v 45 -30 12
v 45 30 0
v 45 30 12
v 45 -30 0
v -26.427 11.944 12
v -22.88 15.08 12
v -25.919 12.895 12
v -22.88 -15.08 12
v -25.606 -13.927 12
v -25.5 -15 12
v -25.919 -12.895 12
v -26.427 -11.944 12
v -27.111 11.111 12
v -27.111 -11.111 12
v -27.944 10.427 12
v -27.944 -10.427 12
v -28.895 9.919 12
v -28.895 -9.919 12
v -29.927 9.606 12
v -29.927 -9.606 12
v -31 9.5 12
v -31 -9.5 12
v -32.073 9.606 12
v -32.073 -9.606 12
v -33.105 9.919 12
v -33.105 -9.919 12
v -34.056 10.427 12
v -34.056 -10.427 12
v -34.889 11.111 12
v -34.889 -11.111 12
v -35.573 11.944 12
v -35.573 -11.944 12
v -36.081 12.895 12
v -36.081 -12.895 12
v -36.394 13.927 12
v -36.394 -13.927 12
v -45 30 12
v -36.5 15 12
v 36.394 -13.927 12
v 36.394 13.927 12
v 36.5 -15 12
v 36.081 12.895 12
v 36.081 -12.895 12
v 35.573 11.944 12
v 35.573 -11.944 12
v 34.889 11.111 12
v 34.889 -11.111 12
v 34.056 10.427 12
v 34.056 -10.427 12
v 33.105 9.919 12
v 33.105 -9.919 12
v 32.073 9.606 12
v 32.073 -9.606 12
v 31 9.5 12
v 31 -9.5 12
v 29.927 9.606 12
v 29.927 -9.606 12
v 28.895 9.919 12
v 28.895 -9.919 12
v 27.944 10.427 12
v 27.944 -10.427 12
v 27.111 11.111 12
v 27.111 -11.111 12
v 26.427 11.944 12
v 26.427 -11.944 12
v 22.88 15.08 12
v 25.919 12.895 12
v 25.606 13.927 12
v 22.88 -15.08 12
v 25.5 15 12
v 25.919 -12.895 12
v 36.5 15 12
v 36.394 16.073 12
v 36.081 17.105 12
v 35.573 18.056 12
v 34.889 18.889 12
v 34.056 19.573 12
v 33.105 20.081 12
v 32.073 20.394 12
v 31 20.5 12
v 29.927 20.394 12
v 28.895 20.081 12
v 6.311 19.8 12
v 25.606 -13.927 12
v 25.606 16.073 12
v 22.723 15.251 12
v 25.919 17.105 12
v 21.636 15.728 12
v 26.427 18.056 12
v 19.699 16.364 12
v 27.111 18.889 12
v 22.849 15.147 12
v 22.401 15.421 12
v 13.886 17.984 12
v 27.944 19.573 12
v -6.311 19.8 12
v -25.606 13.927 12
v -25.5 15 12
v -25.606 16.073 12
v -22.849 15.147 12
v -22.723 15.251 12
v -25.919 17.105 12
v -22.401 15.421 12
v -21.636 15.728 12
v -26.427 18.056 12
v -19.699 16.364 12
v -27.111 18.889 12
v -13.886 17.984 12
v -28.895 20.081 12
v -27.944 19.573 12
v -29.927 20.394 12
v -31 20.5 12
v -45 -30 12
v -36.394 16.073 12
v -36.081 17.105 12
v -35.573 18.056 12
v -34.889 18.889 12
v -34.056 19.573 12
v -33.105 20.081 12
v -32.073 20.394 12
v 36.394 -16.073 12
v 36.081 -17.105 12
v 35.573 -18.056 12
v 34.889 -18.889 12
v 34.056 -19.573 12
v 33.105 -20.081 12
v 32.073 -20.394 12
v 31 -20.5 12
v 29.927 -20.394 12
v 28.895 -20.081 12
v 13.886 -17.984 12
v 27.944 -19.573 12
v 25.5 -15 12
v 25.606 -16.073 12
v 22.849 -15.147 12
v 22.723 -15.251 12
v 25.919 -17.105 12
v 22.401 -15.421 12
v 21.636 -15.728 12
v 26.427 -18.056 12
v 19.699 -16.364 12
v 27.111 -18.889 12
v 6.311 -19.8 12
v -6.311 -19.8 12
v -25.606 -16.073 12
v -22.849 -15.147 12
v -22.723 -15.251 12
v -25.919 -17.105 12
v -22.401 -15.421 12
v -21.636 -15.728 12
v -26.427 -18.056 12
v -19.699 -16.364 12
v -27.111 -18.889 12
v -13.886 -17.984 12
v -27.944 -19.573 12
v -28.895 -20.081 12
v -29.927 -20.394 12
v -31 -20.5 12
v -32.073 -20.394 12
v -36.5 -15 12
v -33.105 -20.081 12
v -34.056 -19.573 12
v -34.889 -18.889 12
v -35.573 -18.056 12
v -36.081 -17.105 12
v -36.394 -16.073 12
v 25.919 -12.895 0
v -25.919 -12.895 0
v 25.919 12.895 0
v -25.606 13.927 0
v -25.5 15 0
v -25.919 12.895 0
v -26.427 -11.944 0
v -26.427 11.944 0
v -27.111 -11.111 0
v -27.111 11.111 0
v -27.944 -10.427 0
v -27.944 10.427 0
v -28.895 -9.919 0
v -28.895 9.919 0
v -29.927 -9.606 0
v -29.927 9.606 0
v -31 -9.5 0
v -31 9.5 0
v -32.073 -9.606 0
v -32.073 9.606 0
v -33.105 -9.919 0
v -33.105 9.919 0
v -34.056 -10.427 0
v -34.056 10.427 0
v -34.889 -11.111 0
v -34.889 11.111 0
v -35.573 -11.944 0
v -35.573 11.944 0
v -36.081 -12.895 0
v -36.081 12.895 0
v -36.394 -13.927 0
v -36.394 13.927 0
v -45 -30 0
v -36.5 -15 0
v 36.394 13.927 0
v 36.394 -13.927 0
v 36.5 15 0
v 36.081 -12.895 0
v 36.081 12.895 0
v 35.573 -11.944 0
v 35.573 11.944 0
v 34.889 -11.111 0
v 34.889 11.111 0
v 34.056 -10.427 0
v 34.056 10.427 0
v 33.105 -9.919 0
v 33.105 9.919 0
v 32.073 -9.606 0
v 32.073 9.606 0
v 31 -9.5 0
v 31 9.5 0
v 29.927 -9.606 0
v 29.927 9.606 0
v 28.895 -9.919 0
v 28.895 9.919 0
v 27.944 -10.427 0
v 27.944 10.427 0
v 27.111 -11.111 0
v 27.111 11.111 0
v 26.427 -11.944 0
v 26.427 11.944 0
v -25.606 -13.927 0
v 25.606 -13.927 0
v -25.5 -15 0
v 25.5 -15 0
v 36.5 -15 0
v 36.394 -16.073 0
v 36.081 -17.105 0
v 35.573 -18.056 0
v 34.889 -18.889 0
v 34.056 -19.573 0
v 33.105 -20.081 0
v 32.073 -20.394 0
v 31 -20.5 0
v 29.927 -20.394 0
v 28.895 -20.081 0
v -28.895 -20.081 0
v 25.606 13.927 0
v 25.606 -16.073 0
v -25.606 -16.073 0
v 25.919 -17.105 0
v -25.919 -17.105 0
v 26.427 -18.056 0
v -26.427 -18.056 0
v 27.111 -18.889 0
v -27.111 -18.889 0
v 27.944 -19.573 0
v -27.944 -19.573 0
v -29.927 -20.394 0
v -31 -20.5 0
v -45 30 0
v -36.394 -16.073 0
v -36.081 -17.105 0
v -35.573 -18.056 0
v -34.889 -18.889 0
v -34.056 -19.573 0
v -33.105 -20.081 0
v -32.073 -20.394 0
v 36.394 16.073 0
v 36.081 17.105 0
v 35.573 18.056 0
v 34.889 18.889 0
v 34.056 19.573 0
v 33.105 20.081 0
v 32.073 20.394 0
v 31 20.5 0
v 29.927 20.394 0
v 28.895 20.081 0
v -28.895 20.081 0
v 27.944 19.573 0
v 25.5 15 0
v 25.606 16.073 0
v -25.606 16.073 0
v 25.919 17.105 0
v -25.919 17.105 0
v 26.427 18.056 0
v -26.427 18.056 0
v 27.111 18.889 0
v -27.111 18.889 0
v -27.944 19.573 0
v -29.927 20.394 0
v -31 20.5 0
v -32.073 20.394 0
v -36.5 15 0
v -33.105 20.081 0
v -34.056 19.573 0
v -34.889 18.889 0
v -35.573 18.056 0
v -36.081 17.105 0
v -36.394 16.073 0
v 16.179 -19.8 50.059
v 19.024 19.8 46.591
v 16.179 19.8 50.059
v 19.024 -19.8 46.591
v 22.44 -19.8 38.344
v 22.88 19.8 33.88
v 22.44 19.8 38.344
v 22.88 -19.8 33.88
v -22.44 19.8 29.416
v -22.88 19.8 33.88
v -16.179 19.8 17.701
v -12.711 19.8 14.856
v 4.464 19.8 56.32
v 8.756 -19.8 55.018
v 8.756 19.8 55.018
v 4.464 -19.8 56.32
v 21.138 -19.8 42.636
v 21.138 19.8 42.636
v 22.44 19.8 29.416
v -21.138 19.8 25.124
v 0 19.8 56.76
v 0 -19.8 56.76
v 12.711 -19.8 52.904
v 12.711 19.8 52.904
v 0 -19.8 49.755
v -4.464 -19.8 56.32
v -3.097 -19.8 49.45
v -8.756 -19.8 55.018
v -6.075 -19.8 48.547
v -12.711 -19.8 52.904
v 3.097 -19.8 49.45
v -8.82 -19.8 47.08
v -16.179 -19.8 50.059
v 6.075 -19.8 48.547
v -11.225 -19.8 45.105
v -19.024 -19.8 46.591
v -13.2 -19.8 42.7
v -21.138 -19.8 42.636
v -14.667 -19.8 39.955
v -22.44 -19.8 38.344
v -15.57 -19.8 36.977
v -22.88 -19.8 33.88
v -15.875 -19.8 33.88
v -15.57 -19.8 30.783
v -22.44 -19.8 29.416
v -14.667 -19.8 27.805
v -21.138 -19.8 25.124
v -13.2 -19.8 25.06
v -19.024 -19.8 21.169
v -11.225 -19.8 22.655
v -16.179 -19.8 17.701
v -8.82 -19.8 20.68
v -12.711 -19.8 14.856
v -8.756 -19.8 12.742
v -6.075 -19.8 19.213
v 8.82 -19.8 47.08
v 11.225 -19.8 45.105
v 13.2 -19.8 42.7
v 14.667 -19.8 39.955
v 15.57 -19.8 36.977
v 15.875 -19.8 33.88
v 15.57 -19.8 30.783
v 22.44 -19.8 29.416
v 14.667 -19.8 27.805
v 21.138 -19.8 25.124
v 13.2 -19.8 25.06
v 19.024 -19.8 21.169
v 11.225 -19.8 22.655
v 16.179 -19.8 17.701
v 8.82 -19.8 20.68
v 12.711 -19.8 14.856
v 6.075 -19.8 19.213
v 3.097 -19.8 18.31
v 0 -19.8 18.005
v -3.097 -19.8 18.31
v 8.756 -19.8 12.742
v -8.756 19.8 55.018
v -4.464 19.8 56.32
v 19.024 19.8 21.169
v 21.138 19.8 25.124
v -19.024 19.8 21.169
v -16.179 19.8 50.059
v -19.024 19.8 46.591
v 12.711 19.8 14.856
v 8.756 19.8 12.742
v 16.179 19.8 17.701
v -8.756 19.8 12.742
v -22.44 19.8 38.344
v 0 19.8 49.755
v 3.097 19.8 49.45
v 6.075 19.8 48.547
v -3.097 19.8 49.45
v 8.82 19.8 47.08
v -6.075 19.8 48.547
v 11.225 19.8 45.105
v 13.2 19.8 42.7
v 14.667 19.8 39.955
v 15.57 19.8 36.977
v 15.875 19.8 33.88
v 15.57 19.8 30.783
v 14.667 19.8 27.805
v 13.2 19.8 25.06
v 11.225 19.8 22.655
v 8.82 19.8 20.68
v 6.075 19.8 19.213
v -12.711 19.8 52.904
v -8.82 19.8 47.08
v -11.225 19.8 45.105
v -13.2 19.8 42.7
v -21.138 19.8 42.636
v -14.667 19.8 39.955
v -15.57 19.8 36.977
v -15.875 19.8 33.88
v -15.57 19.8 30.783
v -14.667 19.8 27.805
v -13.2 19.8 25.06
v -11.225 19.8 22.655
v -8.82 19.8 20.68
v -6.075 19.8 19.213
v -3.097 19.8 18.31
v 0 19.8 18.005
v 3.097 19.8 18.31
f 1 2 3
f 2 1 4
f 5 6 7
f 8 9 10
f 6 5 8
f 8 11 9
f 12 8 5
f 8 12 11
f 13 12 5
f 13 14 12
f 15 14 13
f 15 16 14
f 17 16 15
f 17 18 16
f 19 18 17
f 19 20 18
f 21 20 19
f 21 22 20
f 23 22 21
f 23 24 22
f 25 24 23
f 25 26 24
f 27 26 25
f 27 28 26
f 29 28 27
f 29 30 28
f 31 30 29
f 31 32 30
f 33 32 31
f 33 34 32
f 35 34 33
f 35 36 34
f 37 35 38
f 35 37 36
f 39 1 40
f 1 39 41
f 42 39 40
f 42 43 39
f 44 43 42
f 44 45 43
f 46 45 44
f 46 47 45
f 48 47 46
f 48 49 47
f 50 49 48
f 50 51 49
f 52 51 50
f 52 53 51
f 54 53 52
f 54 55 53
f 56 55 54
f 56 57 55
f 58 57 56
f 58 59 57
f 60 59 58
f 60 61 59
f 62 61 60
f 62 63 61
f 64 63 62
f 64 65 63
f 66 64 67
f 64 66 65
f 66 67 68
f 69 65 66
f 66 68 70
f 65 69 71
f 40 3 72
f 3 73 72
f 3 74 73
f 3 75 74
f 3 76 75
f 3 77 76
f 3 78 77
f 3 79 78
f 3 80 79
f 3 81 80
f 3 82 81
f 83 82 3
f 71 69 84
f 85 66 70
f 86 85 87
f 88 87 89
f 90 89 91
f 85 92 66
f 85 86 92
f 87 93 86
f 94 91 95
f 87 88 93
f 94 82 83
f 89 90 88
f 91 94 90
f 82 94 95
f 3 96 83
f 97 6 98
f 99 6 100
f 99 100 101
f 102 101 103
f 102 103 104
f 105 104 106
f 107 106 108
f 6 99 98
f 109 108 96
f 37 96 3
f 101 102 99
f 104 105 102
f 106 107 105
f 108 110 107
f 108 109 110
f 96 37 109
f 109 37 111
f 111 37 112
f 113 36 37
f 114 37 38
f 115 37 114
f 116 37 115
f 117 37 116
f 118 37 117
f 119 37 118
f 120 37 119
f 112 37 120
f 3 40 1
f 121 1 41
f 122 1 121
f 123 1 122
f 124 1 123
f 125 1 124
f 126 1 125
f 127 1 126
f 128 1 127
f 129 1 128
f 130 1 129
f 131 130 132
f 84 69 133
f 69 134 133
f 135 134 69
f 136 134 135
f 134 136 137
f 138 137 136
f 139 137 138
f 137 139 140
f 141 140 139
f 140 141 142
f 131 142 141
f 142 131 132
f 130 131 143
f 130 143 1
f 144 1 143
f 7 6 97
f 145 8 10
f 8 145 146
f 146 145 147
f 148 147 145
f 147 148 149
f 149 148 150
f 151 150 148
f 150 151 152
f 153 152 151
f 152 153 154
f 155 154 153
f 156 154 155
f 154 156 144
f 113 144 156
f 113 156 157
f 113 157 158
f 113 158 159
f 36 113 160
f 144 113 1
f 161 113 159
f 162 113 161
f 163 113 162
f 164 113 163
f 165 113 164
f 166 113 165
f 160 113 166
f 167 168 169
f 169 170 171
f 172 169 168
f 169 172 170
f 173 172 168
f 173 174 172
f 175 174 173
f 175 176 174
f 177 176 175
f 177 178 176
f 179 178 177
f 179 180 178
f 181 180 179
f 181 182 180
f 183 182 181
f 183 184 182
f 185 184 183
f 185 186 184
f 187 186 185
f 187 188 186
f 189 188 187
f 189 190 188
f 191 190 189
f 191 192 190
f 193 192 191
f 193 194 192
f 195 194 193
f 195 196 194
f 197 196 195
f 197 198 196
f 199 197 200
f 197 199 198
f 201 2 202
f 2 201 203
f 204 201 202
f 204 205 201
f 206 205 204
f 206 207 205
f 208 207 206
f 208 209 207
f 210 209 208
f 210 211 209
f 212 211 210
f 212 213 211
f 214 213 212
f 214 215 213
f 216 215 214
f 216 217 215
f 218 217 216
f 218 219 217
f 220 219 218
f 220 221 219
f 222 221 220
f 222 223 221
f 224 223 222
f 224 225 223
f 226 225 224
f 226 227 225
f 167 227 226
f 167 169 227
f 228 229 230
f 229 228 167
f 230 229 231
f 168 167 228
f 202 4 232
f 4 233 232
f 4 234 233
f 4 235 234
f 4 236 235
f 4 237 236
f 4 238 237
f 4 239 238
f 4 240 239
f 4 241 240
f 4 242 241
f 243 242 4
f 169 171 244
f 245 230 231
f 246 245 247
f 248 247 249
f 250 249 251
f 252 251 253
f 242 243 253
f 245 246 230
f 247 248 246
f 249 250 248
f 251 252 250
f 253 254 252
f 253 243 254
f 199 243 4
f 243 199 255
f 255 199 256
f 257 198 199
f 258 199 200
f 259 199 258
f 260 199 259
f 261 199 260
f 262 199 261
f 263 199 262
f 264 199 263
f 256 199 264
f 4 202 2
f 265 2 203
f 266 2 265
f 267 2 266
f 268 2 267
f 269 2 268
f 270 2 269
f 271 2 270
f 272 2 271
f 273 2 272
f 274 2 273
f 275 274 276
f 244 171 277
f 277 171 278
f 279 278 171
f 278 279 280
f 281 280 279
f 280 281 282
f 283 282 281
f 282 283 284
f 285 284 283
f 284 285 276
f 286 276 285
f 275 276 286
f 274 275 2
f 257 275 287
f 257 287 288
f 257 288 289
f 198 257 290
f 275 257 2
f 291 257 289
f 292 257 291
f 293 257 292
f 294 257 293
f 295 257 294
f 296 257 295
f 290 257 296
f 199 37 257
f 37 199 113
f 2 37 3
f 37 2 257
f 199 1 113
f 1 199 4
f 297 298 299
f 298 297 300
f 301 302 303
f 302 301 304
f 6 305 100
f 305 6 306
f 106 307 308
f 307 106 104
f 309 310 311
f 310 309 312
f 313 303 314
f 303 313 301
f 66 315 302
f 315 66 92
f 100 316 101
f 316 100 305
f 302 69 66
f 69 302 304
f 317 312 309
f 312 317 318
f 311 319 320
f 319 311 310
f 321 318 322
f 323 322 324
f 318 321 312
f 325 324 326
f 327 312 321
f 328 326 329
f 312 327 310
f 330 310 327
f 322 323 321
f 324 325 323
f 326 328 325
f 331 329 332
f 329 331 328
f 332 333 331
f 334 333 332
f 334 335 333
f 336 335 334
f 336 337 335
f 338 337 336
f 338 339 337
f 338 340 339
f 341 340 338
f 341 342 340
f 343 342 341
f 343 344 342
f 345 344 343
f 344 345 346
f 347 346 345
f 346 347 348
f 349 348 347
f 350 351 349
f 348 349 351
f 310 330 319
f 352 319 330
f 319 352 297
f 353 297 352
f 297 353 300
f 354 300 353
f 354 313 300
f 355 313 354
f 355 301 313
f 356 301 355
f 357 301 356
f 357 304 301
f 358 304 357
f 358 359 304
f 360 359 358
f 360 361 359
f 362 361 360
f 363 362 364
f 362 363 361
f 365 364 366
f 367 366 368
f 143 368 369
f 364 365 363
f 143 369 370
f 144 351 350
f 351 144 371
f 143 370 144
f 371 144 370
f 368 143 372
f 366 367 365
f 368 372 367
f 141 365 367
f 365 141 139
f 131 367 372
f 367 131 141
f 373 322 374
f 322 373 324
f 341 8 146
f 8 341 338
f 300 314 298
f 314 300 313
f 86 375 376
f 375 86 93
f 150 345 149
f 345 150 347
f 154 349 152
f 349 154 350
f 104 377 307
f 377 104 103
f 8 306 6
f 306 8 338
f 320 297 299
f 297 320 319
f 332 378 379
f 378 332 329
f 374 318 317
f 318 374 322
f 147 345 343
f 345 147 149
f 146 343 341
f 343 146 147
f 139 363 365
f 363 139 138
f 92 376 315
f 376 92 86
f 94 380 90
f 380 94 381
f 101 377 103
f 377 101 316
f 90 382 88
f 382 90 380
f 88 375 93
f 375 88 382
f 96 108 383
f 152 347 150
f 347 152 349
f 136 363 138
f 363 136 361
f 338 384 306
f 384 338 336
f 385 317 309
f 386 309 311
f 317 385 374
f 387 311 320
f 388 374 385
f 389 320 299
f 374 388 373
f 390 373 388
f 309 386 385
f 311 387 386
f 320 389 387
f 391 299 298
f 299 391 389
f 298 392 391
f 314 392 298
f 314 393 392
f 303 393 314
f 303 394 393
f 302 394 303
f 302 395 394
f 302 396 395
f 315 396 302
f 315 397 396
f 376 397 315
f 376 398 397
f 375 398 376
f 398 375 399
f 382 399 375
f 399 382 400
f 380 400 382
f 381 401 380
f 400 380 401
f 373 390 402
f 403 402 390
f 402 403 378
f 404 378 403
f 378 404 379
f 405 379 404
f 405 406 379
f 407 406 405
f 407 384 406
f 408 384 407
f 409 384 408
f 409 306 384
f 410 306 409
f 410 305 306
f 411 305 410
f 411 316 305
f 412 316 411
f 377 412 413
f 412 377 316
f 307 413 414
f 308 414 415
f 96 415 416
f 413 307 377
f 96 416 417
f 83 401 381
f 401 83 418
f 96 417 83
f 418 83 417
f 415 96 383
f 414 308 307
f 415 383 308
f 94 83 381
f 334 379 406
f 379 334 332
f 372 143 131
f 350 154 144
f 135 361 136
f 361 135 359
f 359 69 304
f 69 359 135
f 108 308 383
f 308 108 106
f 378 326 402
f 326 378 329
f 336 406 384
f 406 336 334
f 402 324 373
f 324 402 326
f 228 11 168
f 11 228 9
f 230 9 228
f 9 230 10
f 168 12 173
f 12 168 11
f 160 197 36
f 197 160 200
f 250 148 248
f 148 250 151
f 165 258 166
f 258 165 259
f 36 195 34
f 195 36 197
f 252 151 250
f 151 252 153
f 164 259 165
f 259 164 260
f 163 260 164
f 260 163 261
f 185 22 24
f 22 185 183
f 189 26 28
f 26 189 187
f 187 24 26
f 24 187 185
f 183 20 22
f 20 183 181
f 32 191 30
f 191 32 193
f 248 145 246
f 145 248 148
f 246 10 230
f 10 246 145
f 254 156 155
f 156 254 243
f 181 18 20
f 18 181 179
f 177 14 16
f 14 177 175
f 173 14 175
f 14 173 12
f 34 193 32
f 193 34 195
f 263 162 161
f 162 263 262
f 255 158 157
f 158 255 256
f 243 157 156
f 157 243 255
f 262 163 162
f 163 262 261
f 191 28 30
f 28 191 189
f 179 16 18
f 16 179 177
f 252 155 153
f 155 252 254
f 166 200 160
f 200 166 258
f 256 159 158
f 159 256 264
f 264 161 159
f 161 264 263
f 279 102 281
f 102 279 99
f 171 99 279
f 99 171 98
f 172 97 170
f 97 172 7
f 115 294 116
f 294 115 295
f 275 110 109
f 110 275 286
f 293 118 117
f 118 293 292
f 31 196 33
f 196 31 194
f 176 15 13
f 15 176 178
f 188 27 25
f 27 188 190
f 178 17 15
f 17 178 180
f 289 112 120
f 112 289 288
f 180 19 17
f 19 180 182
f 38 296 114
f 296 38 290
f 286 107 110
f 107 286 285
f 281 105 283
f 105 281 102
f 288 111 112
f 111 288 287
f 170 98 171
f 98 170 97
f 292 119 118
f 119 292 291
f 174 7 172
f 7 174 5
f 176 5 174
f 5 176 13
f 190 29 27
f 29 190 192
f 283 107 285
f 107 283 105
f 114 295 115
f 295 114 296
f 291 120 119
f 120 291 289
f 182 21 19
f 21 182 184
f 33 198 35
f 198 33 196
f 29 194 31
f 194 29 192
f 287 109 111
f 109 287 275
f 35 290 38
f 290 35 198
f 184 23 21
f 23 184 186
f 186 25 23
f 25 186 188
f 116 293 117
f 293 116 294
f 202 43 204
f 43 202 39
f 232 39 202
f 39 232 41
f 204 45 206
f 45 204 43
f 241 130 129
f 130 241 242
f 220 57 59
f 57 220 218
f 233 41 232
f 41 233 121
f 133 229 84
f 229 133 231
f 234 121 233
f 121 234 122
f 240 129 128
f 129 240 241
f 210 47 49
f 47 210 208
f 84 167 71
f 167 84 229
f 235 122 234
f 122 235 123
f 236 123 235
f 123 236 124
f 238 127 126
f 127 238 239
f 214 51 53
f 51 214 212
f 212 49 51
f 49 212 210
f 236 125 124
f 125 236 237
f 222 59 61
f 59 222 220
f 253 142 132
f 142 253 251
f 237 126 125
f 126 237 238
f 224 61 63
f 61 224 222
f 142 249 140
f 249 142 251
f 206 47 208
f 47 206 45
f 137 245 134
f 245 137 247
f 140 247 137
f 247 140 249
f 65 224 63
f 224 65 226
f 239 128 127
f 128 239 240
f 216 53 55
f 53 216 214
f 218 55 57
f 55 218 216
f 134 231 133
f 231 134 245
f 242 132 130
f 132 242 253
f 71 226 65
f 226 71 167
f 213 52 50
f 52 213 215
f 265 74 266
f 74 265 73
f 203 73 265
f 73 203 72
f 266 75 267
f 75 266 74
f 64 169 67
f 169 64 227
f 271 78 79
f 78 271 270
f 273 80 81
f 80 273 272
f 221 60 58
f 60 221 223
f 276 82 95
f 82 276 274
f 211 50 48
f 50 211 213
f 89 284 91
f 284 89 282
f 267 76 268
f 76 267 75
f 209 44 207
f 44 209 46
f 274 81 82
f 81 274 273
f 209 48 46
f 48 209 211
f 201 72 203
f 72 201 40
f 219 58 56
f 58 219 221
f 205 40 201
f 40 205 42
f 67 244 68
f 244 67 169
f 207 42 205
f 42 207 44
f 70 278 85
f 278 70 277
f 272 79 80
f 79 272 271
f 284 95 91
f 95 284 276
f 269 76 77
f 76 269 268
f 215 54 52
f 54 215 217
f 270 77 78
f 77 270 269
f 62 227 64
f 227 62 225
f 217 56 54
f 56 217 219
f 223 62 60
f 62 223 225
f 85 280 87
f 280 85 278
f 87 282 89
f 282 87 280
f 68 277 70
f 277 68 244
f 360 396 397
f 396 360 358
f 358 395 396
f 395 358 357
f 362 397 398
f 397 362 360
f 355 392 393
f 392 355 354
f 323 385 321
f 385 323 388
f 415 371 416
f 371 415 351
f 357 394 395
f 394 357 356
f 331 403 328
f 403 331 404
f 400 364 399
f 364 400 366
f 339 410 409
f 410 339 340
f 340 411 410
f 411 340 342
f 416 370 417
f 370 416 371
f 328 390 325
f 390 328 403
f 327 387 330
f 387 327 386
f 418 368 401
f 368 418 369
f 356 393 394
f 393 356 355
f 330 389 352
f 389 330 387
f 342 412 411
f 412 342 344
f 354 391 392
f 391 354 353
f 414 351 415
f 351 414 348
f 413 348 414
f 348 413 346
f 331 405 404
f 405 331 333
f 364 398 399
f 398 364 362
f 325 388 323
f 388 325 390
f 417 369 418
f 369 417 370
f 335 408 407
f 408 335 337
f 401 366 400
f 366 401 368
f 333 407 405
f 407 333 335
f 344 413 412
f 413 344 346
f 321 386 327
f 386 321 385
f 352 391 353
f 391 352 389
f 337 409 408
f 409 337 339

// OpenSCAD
$fn = 32;

// ----------------------------------------------------------------------
// Bearing block: 90 x 60 mm base, 31.75 mm bore at 33.88 mm
// ----------------------------------------------------------------------

// --- parameters (mm) ---
base_w = 90;              // base width
base_d = 60;              // base depth
base_t = 12;              // base thickness
bore_d = 31.75;           // shaft / bearing bore
house_r = 22.88;          // housing outer radius
house_len = 39.6;         // housing length along the shaft
foot_w = 45.76;           // foot width under the housing
foot_len = 29.6;          // foot length along the shaft
axis_z = 33.88;           // bore axis height above the base
holes_d = 11;             // mounting holes
hole_x = 31;              // mounting hole spacing

difference() {
  union() {
    /* base plate with its underside on z = 0 */
    translate([0, 0, base_t / 2]) cube([base_w, base_d, base_t], center = true);
    /* hull foot: a straight web blending into the round housing */
    hull() {
      translate([0, 0, base_t - 0.5]) cube([foot_w, foot_len, 1.6], center = true);
      translate([0, 0, axis_z]) rotate([-90, 0, 0]) cylinder(h = house_len, d = 2 * house_r, center = true);
    }
  }
  /* bore through the housing, 2.5 mm clear on both sides */
  translate([0, 0, axis_z]) rotate([-90, 0, 0]) cylinder(h = house_len + 5, d = bore_d, center = true);
  /* mounting holes through the base plate */
  for (hx = [-31, 31]) {
    for (hy = [-15, 15]) {
      translate([hx, hy, -2.5]) cylinder(h = base_t + 5, d = holes_d);
    }
  }
}
